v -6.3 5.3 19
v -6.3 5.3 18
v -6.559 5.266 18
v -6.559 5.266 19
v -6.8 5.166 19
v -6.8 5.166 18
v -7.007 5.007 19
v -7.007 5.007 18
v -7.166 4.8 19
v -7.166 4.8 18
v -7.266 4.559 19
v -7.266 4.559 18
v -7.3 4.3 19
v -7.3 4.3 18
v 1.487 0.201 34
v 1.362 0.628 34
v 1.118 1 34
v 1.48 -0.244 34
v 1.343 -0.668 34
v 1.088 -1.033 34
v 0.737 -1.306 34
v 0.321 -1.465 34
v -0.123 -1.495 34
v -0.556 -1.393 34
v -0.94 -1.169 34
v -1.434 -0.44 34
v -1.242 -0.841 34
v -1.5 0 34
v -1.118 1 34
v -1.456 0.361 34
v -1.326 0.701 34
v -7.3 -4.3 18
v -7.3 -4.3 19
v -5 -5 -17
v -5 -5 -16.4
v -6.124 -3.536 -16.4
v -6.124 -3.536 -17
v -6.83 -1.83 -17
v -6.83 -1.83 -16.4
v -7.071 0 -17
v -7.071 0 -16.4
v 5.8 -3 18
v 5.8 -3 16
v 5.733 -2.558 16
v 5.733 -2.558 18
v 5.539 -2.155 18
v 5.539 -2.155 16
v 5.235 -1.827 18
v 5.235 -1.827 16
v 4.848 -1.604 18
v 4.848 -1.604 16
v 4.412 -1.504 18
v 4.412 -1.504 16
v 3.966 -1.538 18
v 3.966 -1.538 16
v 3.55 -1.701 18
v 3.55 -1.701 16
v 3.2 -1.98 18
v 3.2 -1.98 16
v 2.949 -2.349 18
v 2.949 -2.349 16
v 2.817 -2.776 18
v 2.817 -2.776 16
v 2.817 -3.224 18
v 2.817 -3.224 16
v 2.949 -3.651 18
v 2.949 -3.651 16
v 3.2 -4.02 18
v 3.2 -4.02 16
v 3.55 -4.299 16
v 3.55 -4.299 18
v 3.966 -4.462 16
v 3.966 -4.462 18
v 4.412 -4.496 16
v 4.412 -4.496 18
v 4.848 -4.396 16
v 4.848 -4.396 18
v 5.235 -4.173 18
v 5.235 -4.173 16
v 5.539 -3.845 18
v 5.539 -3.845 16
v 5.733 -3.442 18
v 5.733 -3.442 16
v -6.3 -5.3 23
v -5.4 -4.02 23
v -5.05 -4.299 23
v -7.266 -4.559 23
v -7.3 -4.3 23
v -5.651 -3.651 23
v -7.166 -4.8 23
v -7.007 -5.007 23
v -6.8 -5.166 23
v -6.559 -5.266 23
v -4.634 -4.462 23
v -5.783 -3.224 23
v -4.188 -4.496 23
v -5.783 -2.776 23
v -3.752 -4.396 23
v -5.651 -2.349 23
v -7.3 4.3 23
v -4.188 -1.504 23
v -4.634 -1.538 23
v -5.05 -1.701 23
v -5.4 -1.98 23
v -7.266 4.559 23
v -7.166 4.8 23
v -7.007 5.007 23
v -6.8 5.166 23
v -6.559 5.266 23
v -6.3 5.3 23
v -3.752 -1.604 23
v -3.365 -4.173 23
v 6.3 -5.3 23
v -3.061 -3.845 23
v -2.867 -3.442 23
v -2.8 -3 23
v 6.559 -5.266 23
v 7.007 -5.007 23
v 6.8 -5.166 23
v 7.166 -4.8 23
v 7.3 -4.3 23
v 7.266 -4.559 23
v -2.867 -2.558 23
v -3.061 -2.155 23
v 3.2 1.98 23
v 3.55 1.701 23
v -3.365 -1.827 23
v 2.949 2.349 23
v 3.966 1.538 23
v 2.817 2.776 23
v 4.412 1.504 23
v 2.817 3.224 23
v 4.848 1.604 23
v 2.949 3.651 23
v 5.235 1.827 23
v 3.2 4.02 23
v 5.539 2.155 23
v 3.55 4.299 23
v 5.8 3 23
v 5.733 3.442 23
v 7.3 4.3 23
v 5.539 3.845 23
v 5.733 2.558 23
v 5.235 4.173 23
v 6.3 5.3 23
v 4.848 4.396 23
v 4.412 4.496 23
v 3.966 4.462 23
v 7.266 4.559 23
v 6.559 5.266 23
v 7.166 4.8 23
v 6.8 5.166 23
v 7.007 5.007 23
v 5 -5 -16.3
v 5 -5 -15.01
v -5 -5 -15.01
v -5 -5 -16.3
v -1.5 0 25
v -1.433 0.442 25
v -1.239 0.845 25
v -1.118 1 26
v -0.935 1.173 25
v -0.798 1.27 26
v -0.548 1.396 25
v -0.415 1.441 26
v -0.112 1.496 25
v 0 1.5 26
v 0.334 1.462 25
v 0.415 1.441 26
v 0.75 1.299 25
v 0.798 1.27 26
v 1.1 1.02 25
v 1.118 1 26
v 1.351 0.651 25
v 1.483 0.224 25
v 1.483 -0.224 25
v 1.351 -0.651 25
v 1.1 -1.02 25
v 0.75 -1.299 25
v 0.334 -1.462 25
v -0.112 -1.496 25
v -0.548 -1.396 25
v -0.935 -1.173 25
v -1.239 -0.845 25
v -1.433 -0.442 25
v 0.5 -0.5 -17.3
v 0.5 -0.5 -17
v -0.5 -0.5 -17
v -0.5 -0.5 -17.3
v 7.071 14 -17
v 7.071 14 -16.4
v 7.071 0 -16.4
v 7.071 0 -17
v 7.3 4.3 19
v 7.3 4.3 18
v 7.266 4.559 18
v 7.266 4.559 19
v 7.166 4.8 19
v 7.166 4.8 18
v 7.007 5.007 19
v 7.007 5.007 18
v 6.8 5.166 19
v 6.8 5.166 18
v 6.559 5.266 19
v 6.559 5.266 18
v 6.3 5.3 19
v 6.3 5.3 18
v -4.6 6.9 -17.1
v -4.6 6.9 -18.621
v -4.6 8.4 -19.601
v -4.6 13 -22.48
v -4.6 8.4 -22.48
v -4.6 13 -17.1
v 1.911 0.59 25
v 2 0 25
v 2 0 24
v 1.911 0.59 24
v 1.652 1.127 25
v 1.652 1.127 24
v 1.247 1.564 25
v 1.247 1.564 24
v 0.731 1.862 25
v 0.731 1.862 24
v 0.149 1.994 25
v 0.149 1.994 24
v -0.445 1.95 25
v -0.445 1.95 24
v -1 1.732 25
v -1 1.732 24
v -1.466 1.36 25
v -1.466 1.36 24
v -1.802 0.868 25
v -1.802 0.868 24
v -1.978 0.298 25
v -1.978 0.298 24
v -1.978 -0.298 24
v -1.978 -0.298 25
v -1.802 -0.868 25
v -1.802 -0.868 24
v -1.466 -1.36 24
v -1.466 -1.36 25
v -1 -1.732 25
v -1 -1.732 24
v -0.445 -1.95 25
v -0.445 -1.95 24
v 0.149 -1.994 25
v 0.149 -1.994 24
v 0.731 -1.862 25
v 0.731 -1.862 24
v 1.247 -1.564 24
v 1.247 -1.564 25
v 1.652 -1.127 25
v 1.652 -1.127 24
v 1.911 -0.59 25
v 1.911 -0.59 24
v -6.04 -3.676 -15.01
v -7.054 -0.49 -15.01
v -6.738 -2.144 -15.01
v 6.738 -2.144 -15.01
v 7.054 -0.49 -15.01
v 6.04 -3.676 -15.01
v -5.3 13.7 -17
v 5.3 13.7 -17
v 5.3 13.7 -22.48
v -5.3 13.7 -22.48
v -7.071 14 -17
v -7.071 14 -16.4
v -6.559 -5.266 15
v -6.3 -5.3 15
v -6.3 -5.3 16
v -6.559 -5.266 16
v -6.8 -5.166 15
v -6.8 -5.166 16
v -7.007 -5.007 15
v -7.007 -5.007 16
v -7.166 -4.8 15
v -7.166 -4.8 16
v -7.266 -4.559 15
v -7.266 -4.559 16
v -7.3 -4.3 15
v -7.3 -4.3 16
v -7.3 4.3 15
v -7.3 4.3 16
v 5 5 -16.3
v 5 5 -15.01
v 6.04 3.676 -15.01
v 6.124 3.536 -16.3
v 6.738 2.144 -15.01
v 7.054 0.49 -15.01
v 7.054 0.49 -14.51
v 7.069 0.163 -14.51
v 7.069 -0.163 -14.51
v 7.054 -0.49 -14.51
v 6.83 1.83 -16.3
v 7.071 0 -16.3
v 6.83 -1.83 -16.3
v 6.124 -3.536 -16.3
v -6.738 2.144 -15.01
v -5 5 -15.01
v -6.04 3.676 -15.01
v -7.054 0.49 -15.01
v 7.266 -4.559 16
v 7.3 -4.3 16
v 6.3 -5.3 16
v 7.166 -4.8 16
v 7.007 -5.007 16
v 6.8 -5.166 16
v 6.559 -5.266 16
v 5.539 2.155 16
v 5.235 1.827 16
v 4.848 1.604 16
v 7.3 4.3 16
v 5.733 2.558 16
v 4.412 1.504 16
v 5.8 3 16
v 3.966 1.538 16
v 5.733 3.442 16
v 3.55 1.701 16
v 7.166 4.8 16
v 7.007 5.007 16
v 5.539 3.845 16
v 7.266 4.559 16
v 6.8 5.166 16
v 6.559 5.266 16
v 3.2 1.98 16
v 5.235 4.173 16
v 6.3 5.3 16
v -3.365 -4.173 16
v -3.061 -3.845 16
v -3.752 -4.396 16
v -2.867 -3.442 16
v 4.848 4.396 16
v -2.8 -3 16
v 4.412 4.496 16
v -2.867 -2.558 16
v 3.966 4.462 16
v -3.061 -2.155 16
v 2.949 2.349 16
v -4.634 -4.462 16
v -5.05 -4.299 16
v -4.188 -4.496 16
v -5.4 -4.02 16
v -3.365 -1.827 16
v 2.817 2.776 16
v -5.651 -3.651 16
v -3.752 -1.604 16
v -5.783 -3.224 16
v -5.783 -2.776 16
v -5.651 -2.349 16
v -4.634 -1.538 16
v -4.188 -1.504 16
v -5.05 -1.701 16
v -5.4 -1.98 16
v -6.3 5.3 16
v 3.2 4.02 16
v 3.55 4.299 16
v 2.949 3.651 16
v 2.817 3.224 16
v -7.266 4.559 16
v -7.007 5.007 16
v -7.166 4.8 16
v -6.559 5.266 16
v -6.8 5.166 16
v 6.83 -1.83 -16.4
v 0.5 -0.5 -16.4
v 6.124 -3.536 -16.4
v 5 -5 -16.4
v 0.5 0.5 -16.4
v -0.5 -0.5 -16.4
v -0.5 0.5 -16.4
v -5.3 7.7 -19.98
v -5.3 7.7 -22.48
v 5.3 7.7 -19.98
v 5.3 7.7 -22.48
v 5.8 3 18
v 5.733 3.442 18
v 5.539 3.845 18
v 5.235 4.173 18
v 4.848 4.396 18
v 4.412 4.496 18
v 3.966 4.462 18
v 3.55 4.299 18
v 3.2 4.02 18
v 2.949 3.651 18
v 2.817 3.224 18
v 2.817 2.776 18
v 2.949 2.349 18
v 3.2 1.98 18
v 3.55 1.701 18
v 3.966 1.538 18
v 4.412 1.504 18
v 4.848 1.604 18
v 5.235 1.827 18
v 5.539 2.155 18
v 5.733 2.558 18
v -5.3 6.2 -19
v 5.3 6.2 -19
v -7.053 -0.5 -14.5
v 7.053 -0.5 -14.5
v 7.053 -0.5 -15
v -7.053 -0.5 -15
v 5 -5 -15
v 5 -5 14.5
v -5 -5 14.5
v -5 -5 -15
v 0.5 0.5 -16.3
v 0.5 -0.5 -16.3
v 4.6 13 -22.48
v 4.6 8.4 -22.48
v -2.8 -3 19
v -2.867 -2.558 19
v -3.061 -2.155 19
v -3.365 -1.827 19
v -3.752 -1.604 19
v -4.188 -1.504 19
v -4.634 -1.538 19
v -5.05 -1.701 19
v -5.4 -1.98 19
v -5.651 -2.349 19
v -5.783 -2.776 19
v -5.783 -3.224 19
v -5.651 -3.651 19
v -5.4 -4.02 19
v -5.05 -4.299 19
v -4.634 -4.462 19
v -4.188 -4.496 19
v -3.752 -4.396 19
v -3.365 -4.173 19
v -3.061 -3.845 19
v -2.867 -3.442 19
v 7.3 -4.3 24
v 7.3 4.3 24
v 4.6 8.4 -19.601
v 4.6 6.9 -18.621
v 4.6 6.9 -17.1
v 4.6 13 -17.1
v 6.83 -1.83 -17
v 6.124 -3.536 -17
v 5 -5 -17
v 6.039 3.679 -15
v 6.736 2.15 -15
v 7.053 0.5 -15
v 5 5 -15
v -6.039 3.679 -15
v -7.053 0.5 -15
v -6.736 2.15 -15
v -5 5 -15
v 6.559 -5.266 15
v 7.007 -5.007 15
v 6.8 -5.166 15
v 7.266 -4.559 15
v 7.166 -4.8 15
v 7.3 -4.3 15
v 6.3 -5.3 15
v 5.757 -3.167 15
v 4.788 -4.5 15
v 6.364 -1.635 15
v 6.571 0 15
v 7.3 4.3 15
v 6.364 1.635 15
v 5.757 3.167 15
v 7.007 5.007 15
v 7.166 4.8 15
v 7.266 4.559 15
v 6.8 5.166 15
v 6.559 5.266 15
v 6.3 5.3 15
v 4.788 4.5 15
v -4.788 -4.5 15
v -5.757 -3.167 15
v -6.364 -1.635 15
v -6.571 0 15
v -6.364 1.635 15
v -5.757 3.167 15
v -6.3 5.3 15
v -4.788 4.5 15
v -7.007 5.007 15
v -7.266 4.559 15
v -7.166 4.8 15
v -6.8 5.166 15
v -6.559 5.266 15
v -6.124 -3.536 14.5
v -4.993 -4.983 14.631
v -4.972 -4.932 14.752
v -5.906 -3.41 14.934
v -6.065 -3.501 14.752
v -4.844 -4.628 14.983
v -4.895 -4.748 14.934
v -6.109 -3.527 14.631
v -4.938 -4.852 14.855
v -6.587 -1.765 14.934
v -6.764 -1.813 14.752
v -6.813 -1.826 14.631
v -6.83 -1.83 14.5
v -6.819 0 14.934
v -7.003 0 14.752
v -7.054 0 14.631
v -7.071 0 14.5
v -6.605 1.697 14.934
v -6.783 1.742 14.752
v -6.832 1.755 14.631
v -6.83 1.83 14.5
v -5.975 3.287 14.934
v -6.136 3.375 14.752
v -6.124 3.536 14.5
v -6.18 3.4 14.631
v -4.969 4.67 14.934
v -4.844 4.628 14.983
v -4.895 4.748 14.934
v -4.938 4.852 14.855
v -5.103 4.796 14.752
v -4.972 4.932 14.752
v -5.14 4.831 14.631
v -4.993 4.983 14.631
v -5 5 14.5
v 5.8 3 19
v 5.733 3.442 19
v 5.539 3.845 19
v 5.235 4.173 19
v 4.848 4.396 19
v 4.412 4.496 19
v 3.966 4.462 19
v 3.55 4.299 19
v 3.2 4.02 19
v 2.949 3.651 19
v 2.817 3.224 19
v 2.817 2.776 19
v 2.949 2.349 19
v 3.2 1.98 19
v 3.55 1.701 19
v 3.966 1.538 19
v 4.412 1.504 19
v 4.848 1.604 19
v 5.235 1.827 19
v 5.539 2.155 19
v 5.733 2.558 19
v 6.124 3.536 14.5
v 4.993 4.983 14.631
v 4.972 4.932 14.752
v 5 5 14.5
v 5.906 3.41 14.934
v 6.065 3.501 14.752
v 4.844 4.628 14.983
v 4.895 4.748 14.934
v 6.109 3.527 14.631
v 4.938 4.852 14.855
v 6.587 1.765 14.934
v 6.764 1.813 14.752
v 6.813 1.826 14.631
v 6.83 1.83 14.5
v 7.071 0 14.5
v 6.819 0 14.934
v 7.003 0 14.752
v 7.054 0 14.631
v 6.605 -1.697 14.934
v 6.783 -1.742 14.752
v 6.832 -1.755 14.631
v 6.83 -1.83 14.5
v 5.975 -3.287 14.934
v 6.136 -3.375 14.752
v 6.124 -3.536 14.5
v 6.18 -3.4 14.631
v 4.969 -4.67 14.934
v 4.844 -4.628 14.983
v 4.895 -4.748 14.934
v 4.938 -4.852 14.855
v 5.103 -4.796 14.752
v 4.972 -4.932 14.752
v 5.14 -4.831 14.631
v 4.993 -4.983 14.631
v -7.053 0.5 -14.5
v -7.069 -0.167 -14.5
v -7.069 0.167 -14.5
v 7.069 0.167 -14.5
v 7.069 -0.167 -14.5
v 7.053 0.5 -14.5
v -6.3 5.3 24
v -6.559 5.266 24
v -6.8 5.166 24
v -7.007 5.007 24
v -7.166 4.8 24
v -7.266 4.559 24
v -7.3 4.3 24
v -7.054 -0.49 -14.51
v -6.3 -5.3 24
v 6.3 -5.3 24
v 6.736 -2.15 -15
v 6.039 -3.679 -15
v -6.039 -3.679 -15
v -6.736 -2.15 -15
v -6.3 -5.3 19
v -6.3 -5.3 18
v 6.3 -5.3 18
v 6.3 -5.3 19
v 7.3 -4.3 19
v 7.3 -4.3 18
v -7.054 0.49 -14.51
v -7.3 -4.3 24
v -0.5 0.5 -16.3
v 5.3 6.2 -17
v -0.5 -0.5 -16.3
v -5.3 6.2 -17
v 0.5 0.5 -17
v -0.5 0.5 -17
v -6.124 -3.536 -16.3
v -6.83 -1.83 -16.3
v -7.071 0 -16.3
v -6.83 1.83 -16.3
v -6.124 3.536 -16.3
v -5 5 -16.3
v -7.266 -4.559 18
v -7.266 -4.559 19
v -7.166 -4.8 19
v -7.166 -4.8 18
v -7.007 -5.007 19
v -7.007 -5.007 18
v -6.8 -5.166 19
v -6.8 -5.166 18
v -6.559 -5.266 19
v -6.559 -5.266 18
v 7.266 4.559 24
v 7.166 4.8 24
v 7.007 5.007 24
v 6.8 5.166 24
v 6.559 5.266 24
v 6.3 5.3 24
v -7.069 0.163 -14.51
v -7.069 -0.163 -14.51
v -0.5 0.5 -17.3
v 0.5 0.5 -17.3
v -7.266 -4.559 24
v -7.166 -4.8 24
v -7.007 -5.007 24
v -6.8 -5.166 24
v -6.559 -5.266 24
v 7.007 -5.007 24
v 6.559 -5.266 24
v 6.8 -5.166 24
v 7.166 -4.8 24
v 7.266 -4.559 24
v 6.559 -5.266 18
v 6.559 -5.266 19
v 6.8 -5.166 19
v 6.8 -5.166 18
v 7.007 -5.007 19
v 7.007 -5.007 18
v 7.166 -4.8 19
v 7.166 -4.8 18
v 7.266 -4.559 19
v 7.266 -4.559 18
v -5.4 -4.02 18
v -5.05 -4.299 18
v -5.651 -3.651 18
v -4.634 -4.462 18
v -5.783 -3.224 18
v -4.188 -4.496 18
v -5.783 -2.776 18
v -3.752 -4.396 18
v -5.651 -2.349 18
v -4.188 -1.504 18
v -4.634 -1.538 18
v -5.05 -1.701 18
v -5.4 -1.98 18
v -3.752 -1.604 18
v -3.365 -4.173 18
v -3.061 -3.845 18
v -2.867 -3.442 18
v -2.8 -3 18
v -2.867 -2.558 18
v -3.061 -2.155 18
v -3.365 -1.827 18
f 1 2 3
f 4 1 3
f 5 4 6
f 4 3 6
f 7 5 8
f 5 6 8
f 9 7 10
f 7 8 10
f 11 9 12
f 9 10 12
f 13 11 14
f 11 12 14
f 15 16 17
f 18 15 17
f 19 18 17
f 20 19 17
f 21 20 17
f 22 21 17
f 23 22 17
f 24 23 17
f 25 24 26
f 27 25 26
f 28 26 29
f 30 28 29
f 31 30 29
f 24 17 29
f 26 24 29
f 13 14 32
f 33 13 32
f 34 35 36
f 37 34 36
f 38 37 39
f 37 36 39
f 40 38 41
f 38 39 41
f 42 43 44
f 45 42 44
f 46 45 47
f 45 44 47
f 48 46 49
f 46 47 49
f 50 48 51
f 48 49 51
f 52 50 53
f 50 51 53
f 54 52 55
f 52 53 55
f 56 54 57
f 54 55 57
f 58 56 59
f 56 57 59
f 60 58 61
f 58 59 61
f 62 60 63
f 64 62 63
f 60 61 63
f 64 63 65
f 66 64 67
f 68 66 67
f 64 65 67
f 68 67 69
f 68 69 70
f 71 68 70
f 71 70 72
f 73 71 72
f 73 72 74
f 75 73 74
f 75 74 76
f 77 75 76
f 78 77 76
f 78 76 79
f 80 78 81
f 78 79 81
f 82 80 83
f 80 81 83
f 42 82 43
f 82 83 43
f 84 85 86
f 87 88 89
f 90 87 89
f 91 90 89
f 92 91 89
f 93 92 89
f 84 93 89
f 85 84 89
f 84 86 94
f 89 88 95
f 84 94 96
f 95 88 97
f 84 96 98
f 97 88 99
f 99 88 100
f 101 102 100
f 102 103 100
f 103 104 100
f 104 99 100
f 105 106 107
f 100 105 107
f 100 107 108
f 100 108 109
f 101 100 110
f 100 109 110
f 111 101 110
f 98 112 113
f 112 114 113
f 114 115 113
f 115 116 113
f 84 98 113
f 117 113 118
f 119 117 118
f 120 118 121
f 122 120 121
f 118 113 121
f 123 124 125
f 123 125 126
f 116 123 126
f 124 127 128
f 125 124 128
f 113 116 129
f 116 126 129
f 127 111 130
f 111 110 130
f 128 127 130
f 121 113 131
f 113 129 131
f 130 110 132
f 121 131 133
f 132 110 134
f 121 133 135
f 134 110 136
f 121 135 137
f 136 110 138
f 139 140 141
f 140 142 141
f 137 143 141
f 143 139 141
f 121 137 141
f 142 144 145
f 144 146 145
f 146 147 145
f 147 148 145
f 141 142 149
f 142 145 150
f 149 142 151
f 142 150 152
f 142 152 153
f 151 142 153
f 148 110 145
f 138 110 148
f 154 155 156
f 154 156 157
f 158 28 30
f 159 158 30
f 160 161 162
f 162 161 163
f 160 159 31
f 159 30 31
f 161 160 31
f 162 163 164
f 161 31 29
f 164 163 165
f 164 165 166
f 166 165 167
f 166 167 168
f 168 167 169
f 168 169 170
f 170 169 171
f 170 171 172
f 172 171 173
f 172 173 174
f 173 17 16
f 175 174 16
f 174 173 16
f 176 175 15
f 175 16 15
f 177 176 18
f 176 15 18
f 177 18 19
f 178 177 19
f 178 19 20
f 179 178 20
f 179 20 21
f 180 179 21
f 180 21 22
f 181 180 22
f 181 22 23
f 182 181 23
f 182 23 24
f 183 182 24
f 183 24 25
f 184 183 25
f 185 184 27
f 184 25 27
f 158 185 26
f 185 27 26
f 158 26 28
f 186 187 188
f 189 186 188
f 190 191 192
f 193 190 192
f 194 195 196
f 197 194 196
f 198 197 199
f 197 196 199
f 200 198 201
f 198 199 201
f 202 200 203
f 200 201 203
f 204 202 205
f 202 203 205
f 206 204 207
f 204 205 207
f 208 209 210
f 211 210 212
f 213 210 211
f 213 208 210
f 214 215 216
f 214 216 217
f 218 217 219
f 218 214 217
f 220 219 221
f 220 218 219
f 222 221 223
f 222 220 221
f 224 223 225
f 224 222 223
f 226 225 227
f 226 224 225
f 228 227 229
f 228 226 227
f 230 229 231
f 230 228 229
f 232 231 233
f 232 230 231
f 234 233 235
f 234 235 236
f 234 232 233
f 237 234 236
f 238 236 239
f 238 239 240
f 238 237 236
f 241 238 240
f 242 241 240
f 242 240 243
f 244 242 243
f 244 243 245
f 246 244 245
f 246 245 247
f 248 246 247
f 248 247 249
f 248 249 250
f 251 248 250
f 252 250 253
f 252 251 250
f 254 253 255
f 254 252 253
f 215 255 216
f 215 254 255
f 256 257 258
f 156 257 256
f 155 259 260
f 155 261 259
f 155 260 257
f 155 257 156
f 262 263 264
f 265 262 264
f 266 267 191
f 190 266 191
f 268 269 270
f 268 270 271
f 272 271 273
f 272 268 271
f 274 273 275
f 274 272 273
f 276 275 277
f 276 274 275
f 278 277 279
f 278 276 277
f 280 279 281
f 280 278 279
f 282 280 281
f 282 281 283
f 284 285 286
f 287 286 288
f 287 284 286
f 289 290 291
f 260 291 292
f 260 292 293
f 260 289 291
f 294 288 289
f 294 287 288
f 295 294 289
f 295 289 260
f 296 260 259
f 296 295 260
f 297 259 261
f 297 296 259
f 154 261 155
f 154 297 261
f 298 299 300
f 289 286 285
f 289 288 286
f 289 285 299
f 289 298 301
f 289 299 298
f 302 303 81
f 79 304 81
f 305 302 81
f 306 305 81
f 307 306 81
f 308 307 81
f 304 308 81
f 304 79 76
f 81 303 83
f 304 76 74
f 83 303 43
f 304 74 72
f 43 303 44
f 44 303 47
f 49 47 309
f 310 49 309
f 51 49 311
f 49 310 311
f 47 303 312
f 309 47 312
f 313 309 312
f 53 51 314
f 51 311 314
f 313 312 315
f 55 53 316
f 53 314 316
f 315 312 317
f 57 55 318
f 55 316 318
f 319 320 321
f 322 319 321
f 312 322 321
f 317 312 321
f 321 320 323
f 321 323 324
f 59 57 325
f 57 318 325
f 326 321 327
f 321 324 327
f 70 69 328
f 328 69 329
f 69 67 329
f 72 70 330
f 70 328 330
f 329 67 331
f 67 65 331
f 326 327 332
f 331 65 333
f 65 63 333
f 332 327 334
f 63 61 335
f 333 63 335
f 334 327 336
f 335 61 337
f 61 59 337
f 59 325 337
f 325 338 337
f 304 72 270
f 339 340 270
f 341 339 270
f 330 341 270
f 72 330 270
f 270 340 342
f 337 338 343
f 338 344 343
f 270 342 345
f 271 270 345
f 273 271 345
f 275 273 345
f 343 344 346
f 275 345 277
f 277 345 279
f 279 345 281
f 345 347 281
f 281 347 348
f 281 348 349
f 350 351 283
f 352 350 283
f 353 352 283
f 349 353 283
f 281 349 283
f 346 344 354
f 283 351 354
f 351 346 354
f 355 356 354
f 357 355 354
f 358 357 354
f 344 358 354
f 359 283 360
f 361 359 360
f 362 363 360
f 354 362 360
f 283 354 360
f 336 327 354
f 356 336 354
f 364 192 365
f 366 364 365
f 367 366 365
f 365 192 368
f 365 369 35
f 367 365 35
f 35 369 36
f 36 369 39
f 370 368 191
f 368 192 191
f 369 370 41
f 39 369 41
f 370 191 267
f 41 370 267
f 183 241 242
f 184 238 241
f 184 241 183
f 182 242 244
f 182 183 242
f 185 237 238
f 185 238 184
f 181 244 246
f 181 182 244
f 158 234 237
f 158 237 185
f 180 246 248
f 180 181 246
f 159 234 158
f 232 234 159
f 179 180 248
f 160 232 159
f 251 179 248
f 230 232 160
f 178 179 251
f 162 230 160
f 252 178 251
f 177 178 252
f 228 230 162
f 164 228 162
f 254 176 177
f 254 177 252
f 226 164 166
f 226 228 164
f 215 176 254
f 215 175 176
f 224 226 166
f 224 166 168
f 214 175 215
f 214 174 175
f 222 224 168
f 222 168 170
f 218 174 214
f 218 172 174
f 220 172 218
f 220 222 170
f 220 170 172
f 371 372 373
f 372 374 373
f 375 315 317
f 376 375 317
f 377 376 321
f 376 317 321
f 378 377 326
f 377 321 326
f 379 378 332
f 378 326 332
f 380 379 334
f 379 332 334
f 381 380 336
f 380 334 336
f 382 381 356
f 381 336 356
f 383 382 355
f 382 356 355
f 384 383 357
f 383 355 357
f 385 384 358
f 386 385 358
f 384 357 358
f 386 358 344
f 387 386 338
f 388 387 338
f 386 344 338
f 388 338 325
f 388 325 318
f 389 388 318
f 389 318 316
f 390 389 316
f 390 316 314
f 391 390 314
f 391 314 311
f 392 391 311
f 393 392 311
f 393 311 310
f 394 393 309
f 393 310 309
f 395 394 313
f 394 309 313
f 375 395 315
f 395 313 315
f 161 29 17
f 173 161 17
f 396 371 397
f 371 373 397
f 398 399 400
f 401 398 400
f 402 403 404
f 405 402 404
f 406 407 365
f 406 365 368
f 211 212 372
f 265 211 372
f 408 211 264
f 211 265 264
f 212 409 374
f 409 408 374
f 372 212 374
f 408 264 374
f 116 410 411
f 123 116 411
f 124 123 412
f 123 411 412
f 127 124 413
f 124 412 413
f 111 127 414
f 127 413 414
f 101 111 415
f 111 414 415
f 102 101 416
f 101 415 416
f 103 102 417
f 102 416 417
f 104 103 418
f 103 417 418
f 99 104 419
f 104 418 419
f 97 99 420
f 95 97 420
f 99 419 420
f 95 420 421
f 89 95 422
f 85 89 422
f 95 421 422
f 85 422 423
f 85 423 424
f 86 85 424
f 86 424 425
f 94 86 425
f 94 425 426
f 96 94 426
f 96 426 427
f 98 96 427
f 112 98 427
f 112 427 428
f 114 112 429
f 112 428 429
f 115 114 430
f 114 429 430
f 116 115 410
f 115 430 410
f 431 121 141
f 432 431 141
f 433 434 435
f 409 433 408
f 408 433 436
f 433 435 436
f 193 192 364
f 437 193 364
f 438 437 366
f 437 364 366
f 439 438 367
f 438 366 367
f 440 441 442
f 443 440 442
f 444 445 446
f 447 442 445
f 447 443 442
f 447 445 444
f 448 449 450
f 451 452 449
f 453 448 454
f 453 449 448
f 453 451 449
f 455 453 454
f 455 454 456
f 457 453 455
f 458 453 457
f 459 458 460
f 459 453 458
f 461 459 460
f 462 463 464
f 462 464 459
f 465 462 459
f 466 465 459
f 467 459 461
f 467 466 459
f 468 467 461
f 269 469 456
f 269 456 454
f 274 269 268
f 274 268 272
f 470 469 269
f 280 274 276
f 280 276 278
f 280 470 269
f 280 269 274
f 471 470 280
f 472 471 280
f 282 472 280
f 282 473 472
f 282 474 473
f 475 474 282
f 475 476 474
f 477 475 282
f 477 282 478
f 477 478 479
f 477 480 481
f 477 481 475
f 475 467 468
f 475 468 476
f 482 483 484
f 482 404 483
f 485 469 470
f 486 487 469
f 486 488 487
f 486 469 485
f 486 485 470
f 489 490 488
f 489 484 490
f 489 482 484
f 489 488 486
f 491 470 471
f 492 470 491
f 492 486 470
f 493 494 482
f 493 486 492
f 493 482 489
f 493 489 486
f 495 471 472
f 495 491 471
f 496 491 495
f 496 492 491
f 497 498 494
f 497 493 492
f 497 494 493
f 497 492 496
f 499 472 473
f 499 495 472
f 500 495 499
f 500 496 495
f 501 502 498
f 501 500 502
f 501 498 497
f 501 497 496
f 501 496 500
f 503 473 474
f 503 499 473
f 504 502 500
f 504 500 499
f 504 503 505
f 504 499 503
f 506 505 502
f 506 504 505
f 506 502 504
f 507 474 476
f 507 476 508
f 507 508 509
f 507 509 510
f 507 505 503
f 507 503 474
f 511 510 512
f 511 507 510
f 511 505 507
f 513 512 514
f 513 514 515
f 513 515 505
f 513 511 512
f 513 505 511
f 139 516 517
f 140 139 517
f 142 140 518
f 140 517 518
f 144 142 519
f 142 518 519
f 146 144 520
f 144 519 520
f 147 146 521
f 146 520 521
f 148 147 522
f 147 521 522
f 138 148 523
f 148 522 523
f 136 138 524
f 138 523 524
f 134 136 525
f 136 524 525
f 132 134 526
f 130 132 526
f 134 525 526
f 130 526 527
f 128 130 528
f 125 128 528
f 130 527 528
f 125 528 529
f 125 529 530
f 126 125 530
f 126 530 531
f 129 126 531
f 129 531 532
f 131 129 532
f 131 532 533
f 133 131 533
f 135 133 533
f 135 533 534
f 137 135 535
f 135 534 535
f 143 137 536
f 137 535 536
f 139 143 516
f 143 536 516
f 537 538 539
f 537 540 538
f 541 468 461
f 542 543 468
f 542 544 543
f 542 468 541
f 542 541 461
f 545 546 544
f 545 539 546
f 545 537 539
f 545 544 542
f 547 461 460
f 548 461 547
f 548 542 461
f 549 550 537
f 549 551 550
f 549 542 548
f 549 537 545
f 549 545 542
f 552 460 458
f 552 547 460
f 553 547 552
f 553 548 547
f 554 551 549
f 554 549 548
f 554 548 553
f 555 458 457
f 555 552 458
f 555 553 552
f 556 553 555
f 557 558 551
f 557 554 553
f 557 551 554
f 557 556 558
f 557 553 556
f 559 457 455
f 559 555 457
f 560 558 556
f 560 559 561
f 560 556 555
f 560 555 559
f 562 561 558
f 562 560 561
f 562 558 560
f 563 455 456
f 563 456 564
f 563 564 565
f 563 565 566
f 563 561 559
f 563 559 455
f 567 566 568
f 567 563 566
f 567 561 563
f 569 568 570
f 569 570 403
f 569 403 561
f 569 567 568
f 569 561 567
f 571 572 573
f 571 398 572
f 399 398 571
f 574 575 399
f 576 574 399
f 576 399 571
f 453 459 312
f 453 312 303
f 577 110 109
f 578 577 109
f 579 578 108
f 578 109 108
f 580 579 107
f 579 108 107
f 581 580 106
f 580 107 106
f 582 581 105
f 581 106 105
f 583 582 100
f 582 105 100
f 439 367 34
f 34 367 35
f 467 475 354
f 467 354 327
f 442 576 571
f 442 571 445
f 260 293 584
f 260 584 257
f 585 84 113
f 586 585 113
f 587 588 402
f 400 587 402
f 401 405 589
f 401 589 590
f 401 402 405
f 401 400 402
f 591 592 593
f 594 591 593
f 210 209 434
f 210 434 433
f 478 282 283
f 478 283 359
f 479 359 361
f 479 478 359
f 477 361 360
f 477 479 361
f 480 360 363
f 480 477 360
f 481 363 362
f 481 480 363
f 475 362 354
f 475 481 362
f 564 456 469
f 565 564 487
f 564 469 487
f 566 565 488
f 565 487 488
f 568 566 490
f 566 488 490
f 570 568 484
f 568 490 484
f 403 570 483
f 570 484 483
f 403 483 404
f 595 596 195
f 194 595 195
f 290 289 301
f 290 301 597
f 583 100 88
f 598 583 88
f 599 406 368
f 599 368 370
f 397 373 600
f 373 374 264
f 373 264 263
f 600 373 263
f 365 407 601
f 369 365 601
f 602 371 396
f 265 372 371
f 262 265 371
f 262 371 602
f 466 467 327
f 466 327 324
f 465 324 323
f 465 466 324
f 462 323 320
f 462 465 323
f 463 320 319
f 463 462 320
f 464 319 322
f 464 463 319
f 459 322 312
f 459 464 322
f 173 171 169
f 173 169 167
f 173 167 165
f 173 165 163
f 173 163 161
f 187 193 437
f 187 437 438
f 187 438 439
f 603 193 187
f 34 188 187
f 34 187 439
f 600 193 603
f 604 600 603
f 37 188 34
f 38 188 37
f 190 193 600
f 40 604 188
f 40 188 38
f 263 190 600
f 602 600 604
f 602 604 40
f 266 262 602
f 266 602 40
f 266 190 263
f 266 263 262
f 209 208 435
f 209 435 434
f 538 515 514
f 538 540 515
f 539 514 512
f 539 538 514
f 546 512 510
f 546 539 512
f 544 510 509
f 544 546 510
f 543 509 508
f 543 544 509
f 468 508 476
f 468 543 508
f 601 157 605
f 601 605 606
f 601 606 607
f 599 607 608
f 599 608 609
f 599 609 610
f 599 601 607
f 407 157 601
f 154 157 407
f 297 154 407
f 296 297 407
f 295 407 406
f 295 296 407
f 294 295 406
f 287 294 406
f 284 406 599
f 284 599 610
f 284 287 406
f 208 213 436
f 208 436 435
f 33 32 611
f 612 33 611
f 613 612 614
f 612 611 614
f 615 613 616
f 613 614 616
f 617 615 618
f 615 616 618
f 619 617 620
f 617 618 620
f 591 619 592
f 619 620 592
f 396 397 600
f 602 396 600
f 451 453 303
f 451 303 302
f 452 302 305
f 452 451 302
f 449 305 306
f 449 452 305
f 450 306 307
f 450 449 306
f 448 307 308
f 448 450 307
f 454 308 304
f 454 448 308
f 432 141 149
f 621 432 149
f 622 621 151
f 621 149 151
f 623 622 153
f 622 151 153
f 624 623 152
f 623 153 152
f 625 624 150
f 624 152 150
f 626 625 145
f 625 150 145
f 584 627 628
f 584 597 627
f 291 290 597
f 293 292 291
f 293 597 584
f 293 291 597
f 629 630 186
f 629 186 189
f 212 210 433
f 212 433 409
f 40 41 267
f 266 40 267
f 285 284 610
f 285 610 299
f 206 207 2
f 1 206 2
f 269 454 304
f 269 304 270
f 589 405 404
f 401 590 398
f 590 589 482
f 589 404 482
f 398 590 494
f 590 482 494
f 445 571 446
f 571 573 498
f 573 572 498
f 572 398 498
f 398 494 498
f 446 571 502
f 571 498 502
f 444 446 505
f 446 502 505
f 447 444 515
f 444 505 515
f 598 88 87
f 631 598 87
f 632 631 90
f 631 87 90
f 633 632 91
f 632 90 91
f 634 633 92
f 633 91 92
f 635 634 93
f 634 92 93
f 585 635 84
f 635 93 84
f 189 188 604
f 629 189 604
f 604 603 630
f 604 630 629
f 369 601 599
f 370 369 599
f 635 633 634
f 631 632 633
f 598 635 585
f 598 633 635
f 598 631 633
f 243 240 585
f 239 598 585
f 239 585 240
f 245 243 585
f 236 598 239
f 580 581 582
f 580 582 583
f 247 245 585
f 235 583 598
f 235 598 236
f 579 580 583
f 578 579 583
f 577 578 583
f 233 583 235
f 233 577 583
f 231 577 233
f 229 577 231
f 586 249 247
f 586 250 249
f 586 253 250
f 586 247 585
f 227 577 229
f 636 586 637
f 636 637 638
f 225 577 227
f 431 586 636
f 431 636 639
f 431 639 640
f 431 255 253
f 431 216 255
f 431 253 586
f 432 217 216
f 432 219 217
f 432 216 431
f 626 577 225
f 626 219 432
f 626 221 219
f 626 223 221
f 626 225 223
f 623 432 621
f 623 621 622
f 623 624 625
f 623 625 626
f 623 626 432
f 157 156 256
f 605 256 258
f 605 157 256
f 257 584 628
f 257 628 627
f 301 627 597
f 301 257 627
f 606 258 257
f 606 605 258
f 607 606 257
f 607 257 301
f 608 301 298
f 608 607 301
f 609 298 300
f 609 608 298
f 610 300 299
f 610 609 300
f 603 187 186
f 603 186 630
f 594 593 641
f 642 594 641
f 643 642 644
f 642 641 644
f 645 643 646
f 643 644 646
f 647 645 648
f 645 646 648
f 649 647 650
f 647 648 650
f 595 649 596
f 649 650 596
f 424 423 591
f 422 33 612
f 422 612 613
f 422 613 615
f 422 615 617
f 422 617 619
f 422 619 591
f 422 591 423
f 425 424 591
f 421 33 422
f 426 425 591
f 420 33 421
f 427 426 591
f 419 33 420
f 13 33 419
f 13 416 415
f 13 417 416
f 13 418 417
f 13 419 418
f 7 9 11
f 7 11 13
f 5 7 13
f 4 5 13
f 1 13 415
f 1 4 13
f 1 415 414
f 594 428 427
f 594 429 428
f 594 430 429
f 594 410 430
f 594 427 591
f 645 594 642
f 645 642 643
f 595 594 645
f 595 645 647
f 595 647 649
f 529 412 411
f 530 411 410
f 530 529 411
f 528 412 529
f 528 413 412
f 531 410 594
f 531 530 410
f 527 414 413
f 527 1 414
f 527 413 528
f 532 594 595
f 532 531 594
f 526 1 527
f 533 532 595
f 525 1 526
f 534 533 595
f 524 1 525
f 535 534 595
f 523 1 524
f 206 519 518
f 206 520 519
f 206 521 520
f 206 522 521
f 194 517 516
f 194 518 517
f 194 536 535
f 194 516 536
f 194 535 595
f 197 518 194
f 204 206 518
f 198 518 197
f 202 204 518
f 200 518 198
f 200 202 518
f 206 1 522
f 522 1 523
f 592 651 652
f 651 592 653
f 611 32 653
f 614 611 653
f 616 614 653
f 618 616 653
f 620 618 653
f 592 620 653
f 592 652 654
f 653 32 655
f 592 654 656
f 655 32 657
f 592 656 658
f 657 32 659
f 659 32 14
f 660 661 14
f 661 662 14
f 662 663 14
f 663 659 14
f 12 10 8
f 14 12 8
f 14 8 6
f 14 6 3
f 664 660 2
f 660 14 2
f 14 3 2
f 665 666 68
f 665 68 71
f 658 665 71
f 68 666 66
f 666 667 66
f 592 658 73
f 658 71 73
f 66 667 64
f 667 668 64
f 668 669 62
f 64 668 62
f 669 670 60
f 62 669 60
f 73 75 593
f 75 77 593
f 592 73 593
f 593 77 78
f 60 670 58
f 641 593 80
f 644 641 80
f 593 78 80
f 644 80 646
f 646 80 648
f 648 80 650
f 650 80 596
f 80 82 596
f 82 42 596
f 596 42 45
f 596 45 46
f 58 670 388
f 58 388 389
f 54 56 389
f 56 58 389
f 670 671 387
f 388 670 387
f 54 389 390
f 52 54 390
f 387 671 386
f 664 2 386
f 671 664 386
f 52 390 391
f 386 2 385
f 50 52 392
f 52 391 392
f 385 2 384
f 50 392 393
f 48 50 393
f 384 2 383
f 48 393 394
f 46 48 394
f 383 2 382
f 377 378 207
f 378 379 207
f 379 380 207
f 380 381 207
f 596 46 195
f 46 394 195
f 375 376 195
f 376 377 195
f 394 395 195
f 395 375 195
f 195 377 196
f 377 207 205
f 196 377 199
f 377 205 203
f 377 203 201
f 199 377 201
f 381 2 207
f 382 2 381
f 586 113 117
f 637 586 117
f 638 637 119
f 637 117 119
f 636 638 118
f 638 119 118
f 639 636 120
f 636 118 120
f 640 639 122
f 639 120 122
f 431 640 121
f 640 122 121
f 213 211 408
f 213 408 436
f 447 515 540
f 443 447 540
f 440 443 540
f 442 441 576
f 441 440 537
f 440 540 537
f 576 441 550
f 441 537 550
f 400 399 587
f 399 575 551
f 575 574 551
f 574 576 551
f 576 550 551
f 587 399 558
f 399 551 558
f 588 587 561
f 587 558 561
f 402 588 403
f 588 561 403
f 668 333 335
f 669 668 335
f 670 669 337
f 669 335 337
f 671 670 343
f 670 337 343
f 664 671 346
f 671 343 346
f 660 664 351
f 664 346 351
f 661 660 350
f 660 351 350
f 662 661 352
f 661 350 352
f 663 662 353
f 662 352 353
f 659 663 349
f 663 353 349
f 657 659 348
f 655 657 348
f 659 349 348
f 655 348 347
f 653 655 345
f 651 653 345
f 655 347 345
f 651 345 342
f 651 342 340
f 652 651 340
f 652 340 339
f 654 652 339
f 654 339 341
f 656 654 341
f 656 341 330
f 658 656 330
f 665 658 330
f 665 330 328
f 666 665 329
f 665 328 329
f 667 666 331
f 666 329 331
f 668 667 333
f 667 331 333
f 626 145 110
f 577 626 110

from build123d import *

# Parameters (mm, degrees)
BOSS_EXTRUDE1_DEPTH                  = 15
FILLET1_R                            = 0.5
SKETCH2_W                            = 1
SKETCH2_H                            = 1
CUT_EXTRUDE1_DEPTH                   = 8
BOSS_EXTRUDE2_REACH                  = 19.321
BOSS_EXTRUDE2_END_RADIUS             = 7.071067812
BOSS_EXTRUDE2_DIRECTION_2_REACH      = 19.321
BOSS_EXTRUDE2_DIRECTION_2_END_RADIUS = 7.071067812
SKETCH4_W                            = 1
SKETCH4_H                            = 1
BOSS_EXTRUDE3_DEPTH                  = 1
BOSS_EXTRUDE4_DEPTH                  = 0.6
BOSS_EXTRUDE5_DEPTH                  = 5.3
SHELL1_START                         = -4.6
SHELL1_DEPTH                         = 9.2
BOSS_EXTRUDE6_DEPTH                  = 1
SKETCH8_R                            = 1.5
BOSS_EXTRUDE7_DEPTH                  = 2
BOSS_EXTRUDE8_DEPTH                  = 1
SKETCH12_R                           = 1.5
BOSS_EXTRUDE9_DEPTH                  = 4
BOSS_EXTRUDE10_DEPTH                 = 1
SKETCH14_R                           = 1.5
CUT_EXTRUDE2_DEPTH                   = 1
BOSS_EXTRUDE11_START                 = 1
SKETCH15_R                           = 2
SKETCH15_R_2                         = 1.5
BOSS_EXTRUDE11_DEPTH                 = 1
BOSS_EXTRUDE12_START                 = -11
SKETCH16_R                           = 1.5
BOSS_EXTRUDE12_DEPTH                 = 11
SKETCH17_W                           = 4.75514305
SKETCH17_H                           = 2
CUT_EXTRUDE3_DEPTH                   = 8


# Read off the part's stored shape, not the designer's step: Shell1
with BuildPart() as part:
    # Sketch1 → Boss-Extrude1 (new, symmetric)
    with BuildSketch(Plane.XY):
        with BuildLine():
            Line((-5, 5), (5, 5))
            ThreePointArc((5, 5), (7.071067812, 0), (5, -5))
            Line((5, -5), (-5, -5))
            ThreePointArc((-5, -5), (-7.071067812, 0), (-5, 5))
        make_face()
    extrude(amount=BOSS_EXTRUDE1_DEPTH, both=True)

    # Fillet1
    fillet1_edges = [part.edges().sort_by_distance(p)[0] for p in [
        (-7.071067812, 0, 15),
        (0, -5, 15),
        (7.071067812, 0, 15),
        (0, 5, 15),
    ]]
    fillet(fillet1_edges, radius=FILLET1_R)

    # Sketch2 → Cut-Extrude1 (cut, symmetric)
    with BuildSketch(Plane(origin=(0, 0, 0), x_dir=(0, 0, -1), z_dir=(1, 0, 0))):
        with Locations((15, 0)):
            Rectangle(SKETCH2_W, SKETCH2_H)
    extrude(amount=CUT_EXTRUDE1_DEPTH, both=True, mode=Mode.SUBTRACT)

    # Sketch7 → Boss-Extrude6 (add)
    with BuildSketch(Plane.XY.offset(15)):
        with BuildLine():
            Line((-6.3, 5.3), (6.3, 5.3))
            ThreePointArc((6.3, 5.3), (7.007106781, 5.007106781), (7.3, 4.3))
            Line((7.3, 4.3), (7.3, -4.3))
            ThreePointArc((7.3, -4.3), (7.007106781, -5.007106781), (6.3, -5.3))
            Line((6.3, -5.3), (-6.3, -5.3))
            ThreePointArc((-6.3, -5.3), (-7.007106781, -5.007106781), (-7.3, -4.3))
            Line((-7.3, -4.3), (-7.3, 4.3))
            ThreePointArc((-7.3, 4.3), (-7.007106781, 5.007106781), (-6.3, 5.3))
        make_face()
    extrude(amount=BOSS_EXTRUDE6_DEPTH)

    # Sketch8 → Boss-Extrude7 (add)
    with BuildSketch(Plane.XY.offset(16)):
        with Locations((4.3, 3)):
            Circle(SKETCH8_R)
        with Locations((4.3, -3)):
            Circle(SKETCH8_R)
        with Locations((-4.3, -3)):
            Circle(SKETCH8_R)
    extrude(amount=BOSS_EXTRUDE7_DEPTH)

    # Sketch10 → Boss-Extrude8 (add)
    with BuildSketch(Plane.XY.offset(18)):
        with BuildLine():
            Line((7.3, -4.3), (7.3, 4.3))
            ThreePointArc((7.3, 4.3), (7.007106781, 5.007106781), (6.3, 5.3))
            Line((6.3, 5.3), (-6.3, 5.3))
            ThreePointArc((-6.3, 5.3), (-7.007106781, 5.007106781), (-7.3, 4.3))
            Line((-7.3, 4.3), (-7.3, -4.3))
            ThreePointArc((-7.3, -4.3), (-7.007106781, -5.007106781), (-6.3, -5.3))
            Line((-6.3, -5.3), (6.3, -5.3))
            ThreePointArc((6.3, -5.3), (7.007106781, -5.007106781), (7.3, -4.3))
        make_face()
    extrude(amount=BOSS_EXTRUDE8_DEPTH)

    # Sketch12 → Boss-Extrude9 (add)
    with BuildSketch(Plane.XY.offset(19)):
        with Locations((-4.3, -3)):
            Circle(SKETCH12_R)
        with Locations((4.3, 3)):
            Circle(SKETCH12_R)
    extrude(amount=BOSS_EXTRUDE9_DEPTH)

    # Sketch13 → Boss-Extrude10 (add)
    with BuildSketch(Plane.XY.offset(23)):
        with BuildLine():
            Line((6.3, 5.3), (-6.3, 5.3))
            ThreePointArc((-6.3, 5.3), (-7.007106781, 5.007106781), (-7.3, 4.3))
            Line((-7.3, 4.3), (-7.3, -4.3))
            ThreePointArc((-7.3, -4.3), (-7.007106781, -5.007106781), (-6.3, -5.3))
            Line((-6.3, -5.3), (6.3, -5.3))
            ThreePointArc((6.3, -5.3), (7.007106781, -5.007106781), (7.3, -4.3))
            Line((7.3, -4.3), (7.3, 4.3))
            ThreePointArc((7.3, 4.3), (7.007106781, 5.007106781), (6.3, 5.3))
        make_face()
    extrude(amount=BOSS_EXTRUDE10_DEPTH)

    # Sketch14 → Cut-Extrude2 (cut)
    with BuildSketch(Plane.XY.offset(24)):
        Circle(SKETCH14_R)
    extrude(amount=-CUT_EXTRUDE2_DEPTH, mode=Mode.SUBTRACT)

    # Sketch15 → Boss-Extrude11 (add)
    with BuildSketch(Plane.XY.offset(24).offset(BOSS_EXTRUDE11_START)):
        Circle(SKETCH15_R)
        Circle(SKETCH15_R_2, mode=Mode.SUBTRACT)
    extrude(amount=-BOSS_EXTRUDE11_DEPTH)

    # Sketch16 → Boss-Extrude12 (add)
    with BuildSketch(Plane(origin=(0, 0, 23), x_dir=(-1, 0, 0), z_dir=(0, 0, -1)).offset(BOSS_EXTRUDE12_START)):
        Circle(SKETCH16_R)
    extrude(amount=BOSS_EXTRUDE12_DEPTH)

    # Sketch17 → Cut-Extrude3 (cut)
    with BuildSketch(Plane.XY.offset(34)):
        with Locations((-0.015438776, 2)):
            Rectangle(SKETCH17_W, SKETCH17_H)
    extrude(amount=-CUT_EXTRUDE3_DEPTH, mode=Mode.SUBTRACT)


with BuildPart() as body_2:
    # Boss-Extrude2: up to this cylinder (the profile starts inside it)
    boss_extrude2_end = Plane(origin=(0, 0, -15.622248), z_dir=(0, 0, -1)) * Cylinder(BOSS_EXTRUDE2_END_RADIUS, 53.784135624, mode=Mode.PRIVATE)
    # Sketch3 → Boss-Extrude2 (new, up to the surface)
    with BuildSketch(Plane(origin=(0, 0, 0), x_dir=(0, 0, -1), z_dir=(1, 0, 0)), mode=Mode.PRIVATE) as boss_extrude2_sk1:
        Polygon((15.01, -5), (16.3, -5), (16.3, 5), (15.01, 5), (15.01, 0.49), (14.51, 0.49), (14.51, -0.49), (15.01, -0.49), align=None)
    boss_extrude2_tool1 = extrude(boss_extrude2_sk1.sketch, amount=BOSS_EXTRUDE2_REACH, mode=Mode.PRIVATE) & boss_extrude2_end
    add(boss_extrude2_tool1.solids().sort_by_distance((0, 0, -15.622248))[0])

    # Boss-Extrude2 direction 2: up to this cylinder (the profile starts inside it)
    boss_extrude2_direction_2_end = Plane(origin=(0, 0, -15.622248), z_dir=(0, 0, -1)) * Cylinder(BOSS_EXTRUDE2_DIRECTION_2_END_RADIUS, 53.784135624, mode=Mode.PRIVATE)
    # Sketch3 → Boss-Extrude2 direction 2 (add, up to the surface)
    with BuildSketch(Plane(origin=(0, 0, 0), x_dir=(0, 0, -1), z_dir=(1, 0, 0)), mode=Mode.PRIVATE) as boss_extrude2_direction_2_sk1:
        Polygon((15.01, -5), (16.3, -5), (16.3, 5), (15.01, 5), (15.01, 0.49), (14.51, 0.49), (14.51, -0.49), (15.01, -0.49), align=None)
    boss_extrude2_direction_2_tool1 = extrude(boss_extrude2_direction_2_sk1.sketch, amount=-BOSS_EXTRUDE2_DIRECTION_2_REACH, mode=Mode.PRIVATE) & boss_extrude2_direction_2_end
    add(boss_extrude2_direction_2_tool1.solids().sort_by_distance((0, 0, -15.622248))[0])

    # Sketch4 → Boss-Extrude3 (add)
    with BuildSketch(Plane(origin=(0, 0, -16.3), x_dir=(-1, 0, 0), z_dir=(0, 0, -1))):
        Rectangle(SKETCH4_W, SKETCH4_H)
    extrude(amount=BOSS_EXTRUDE3_DEPTH)

    # Sketch5 → Boss-Extrude4 (add)
    with BuildSketch(Plane(origin=(0, 0, -16.4), x_dir=(-1, 0, 0), z_dir=(0, 0, -1))):
        with BuildLine():
            Line((-5, -5), (5, -5))
            ThreePointArc((5, -5), (6.532814824, -2.705980501), (7.071067812, 0))
            Line((7.071067812, 0), (7.071067812, 14))
            Line((7.071067812, 14), (-7.071067812, 14))
            Line((-7.071067812, 14), (-7.071067812, 0))
            ThreePointArc((-7.071067812, 0), (-6.532814824, -2.705980501), (-5, -5))
        make_face()
    extrude(amount=BOSS_EXTRUDE4_DEPTH)

    # Sketch6 → Boss-Extrude5 (add, symmetric)
    with BuildSketch(Plane(origin=(0, 0, 0), x_dir=(0, 0, -1), z_dir=(1, 0, 0))):
        Polygon((17, 13.7), (22.48, 13.7), (22.48, 7.7), (19.98, 7.7), (19, 6.2), (17, 6.2), align=None)
    extrude(amount=BOSS_EXTRUDE5_DEPTH, both=True)

    # Shell1 outline → Shell1 (cut)
    with BuildSketch(Plane.YZ.offset(SHELL1_START)):
        Polygon((13, -17.1), (6.9, -17.1), (6.9, -18.621179174), (8.4, -19.601179174), (8.4, -22.48), (13, -22.48), align=None)
    extrude(amount=SHELL1_DEPTH, mode=Mode.SUBTRACT)


solid = Compound([part.part, body_2.part])
